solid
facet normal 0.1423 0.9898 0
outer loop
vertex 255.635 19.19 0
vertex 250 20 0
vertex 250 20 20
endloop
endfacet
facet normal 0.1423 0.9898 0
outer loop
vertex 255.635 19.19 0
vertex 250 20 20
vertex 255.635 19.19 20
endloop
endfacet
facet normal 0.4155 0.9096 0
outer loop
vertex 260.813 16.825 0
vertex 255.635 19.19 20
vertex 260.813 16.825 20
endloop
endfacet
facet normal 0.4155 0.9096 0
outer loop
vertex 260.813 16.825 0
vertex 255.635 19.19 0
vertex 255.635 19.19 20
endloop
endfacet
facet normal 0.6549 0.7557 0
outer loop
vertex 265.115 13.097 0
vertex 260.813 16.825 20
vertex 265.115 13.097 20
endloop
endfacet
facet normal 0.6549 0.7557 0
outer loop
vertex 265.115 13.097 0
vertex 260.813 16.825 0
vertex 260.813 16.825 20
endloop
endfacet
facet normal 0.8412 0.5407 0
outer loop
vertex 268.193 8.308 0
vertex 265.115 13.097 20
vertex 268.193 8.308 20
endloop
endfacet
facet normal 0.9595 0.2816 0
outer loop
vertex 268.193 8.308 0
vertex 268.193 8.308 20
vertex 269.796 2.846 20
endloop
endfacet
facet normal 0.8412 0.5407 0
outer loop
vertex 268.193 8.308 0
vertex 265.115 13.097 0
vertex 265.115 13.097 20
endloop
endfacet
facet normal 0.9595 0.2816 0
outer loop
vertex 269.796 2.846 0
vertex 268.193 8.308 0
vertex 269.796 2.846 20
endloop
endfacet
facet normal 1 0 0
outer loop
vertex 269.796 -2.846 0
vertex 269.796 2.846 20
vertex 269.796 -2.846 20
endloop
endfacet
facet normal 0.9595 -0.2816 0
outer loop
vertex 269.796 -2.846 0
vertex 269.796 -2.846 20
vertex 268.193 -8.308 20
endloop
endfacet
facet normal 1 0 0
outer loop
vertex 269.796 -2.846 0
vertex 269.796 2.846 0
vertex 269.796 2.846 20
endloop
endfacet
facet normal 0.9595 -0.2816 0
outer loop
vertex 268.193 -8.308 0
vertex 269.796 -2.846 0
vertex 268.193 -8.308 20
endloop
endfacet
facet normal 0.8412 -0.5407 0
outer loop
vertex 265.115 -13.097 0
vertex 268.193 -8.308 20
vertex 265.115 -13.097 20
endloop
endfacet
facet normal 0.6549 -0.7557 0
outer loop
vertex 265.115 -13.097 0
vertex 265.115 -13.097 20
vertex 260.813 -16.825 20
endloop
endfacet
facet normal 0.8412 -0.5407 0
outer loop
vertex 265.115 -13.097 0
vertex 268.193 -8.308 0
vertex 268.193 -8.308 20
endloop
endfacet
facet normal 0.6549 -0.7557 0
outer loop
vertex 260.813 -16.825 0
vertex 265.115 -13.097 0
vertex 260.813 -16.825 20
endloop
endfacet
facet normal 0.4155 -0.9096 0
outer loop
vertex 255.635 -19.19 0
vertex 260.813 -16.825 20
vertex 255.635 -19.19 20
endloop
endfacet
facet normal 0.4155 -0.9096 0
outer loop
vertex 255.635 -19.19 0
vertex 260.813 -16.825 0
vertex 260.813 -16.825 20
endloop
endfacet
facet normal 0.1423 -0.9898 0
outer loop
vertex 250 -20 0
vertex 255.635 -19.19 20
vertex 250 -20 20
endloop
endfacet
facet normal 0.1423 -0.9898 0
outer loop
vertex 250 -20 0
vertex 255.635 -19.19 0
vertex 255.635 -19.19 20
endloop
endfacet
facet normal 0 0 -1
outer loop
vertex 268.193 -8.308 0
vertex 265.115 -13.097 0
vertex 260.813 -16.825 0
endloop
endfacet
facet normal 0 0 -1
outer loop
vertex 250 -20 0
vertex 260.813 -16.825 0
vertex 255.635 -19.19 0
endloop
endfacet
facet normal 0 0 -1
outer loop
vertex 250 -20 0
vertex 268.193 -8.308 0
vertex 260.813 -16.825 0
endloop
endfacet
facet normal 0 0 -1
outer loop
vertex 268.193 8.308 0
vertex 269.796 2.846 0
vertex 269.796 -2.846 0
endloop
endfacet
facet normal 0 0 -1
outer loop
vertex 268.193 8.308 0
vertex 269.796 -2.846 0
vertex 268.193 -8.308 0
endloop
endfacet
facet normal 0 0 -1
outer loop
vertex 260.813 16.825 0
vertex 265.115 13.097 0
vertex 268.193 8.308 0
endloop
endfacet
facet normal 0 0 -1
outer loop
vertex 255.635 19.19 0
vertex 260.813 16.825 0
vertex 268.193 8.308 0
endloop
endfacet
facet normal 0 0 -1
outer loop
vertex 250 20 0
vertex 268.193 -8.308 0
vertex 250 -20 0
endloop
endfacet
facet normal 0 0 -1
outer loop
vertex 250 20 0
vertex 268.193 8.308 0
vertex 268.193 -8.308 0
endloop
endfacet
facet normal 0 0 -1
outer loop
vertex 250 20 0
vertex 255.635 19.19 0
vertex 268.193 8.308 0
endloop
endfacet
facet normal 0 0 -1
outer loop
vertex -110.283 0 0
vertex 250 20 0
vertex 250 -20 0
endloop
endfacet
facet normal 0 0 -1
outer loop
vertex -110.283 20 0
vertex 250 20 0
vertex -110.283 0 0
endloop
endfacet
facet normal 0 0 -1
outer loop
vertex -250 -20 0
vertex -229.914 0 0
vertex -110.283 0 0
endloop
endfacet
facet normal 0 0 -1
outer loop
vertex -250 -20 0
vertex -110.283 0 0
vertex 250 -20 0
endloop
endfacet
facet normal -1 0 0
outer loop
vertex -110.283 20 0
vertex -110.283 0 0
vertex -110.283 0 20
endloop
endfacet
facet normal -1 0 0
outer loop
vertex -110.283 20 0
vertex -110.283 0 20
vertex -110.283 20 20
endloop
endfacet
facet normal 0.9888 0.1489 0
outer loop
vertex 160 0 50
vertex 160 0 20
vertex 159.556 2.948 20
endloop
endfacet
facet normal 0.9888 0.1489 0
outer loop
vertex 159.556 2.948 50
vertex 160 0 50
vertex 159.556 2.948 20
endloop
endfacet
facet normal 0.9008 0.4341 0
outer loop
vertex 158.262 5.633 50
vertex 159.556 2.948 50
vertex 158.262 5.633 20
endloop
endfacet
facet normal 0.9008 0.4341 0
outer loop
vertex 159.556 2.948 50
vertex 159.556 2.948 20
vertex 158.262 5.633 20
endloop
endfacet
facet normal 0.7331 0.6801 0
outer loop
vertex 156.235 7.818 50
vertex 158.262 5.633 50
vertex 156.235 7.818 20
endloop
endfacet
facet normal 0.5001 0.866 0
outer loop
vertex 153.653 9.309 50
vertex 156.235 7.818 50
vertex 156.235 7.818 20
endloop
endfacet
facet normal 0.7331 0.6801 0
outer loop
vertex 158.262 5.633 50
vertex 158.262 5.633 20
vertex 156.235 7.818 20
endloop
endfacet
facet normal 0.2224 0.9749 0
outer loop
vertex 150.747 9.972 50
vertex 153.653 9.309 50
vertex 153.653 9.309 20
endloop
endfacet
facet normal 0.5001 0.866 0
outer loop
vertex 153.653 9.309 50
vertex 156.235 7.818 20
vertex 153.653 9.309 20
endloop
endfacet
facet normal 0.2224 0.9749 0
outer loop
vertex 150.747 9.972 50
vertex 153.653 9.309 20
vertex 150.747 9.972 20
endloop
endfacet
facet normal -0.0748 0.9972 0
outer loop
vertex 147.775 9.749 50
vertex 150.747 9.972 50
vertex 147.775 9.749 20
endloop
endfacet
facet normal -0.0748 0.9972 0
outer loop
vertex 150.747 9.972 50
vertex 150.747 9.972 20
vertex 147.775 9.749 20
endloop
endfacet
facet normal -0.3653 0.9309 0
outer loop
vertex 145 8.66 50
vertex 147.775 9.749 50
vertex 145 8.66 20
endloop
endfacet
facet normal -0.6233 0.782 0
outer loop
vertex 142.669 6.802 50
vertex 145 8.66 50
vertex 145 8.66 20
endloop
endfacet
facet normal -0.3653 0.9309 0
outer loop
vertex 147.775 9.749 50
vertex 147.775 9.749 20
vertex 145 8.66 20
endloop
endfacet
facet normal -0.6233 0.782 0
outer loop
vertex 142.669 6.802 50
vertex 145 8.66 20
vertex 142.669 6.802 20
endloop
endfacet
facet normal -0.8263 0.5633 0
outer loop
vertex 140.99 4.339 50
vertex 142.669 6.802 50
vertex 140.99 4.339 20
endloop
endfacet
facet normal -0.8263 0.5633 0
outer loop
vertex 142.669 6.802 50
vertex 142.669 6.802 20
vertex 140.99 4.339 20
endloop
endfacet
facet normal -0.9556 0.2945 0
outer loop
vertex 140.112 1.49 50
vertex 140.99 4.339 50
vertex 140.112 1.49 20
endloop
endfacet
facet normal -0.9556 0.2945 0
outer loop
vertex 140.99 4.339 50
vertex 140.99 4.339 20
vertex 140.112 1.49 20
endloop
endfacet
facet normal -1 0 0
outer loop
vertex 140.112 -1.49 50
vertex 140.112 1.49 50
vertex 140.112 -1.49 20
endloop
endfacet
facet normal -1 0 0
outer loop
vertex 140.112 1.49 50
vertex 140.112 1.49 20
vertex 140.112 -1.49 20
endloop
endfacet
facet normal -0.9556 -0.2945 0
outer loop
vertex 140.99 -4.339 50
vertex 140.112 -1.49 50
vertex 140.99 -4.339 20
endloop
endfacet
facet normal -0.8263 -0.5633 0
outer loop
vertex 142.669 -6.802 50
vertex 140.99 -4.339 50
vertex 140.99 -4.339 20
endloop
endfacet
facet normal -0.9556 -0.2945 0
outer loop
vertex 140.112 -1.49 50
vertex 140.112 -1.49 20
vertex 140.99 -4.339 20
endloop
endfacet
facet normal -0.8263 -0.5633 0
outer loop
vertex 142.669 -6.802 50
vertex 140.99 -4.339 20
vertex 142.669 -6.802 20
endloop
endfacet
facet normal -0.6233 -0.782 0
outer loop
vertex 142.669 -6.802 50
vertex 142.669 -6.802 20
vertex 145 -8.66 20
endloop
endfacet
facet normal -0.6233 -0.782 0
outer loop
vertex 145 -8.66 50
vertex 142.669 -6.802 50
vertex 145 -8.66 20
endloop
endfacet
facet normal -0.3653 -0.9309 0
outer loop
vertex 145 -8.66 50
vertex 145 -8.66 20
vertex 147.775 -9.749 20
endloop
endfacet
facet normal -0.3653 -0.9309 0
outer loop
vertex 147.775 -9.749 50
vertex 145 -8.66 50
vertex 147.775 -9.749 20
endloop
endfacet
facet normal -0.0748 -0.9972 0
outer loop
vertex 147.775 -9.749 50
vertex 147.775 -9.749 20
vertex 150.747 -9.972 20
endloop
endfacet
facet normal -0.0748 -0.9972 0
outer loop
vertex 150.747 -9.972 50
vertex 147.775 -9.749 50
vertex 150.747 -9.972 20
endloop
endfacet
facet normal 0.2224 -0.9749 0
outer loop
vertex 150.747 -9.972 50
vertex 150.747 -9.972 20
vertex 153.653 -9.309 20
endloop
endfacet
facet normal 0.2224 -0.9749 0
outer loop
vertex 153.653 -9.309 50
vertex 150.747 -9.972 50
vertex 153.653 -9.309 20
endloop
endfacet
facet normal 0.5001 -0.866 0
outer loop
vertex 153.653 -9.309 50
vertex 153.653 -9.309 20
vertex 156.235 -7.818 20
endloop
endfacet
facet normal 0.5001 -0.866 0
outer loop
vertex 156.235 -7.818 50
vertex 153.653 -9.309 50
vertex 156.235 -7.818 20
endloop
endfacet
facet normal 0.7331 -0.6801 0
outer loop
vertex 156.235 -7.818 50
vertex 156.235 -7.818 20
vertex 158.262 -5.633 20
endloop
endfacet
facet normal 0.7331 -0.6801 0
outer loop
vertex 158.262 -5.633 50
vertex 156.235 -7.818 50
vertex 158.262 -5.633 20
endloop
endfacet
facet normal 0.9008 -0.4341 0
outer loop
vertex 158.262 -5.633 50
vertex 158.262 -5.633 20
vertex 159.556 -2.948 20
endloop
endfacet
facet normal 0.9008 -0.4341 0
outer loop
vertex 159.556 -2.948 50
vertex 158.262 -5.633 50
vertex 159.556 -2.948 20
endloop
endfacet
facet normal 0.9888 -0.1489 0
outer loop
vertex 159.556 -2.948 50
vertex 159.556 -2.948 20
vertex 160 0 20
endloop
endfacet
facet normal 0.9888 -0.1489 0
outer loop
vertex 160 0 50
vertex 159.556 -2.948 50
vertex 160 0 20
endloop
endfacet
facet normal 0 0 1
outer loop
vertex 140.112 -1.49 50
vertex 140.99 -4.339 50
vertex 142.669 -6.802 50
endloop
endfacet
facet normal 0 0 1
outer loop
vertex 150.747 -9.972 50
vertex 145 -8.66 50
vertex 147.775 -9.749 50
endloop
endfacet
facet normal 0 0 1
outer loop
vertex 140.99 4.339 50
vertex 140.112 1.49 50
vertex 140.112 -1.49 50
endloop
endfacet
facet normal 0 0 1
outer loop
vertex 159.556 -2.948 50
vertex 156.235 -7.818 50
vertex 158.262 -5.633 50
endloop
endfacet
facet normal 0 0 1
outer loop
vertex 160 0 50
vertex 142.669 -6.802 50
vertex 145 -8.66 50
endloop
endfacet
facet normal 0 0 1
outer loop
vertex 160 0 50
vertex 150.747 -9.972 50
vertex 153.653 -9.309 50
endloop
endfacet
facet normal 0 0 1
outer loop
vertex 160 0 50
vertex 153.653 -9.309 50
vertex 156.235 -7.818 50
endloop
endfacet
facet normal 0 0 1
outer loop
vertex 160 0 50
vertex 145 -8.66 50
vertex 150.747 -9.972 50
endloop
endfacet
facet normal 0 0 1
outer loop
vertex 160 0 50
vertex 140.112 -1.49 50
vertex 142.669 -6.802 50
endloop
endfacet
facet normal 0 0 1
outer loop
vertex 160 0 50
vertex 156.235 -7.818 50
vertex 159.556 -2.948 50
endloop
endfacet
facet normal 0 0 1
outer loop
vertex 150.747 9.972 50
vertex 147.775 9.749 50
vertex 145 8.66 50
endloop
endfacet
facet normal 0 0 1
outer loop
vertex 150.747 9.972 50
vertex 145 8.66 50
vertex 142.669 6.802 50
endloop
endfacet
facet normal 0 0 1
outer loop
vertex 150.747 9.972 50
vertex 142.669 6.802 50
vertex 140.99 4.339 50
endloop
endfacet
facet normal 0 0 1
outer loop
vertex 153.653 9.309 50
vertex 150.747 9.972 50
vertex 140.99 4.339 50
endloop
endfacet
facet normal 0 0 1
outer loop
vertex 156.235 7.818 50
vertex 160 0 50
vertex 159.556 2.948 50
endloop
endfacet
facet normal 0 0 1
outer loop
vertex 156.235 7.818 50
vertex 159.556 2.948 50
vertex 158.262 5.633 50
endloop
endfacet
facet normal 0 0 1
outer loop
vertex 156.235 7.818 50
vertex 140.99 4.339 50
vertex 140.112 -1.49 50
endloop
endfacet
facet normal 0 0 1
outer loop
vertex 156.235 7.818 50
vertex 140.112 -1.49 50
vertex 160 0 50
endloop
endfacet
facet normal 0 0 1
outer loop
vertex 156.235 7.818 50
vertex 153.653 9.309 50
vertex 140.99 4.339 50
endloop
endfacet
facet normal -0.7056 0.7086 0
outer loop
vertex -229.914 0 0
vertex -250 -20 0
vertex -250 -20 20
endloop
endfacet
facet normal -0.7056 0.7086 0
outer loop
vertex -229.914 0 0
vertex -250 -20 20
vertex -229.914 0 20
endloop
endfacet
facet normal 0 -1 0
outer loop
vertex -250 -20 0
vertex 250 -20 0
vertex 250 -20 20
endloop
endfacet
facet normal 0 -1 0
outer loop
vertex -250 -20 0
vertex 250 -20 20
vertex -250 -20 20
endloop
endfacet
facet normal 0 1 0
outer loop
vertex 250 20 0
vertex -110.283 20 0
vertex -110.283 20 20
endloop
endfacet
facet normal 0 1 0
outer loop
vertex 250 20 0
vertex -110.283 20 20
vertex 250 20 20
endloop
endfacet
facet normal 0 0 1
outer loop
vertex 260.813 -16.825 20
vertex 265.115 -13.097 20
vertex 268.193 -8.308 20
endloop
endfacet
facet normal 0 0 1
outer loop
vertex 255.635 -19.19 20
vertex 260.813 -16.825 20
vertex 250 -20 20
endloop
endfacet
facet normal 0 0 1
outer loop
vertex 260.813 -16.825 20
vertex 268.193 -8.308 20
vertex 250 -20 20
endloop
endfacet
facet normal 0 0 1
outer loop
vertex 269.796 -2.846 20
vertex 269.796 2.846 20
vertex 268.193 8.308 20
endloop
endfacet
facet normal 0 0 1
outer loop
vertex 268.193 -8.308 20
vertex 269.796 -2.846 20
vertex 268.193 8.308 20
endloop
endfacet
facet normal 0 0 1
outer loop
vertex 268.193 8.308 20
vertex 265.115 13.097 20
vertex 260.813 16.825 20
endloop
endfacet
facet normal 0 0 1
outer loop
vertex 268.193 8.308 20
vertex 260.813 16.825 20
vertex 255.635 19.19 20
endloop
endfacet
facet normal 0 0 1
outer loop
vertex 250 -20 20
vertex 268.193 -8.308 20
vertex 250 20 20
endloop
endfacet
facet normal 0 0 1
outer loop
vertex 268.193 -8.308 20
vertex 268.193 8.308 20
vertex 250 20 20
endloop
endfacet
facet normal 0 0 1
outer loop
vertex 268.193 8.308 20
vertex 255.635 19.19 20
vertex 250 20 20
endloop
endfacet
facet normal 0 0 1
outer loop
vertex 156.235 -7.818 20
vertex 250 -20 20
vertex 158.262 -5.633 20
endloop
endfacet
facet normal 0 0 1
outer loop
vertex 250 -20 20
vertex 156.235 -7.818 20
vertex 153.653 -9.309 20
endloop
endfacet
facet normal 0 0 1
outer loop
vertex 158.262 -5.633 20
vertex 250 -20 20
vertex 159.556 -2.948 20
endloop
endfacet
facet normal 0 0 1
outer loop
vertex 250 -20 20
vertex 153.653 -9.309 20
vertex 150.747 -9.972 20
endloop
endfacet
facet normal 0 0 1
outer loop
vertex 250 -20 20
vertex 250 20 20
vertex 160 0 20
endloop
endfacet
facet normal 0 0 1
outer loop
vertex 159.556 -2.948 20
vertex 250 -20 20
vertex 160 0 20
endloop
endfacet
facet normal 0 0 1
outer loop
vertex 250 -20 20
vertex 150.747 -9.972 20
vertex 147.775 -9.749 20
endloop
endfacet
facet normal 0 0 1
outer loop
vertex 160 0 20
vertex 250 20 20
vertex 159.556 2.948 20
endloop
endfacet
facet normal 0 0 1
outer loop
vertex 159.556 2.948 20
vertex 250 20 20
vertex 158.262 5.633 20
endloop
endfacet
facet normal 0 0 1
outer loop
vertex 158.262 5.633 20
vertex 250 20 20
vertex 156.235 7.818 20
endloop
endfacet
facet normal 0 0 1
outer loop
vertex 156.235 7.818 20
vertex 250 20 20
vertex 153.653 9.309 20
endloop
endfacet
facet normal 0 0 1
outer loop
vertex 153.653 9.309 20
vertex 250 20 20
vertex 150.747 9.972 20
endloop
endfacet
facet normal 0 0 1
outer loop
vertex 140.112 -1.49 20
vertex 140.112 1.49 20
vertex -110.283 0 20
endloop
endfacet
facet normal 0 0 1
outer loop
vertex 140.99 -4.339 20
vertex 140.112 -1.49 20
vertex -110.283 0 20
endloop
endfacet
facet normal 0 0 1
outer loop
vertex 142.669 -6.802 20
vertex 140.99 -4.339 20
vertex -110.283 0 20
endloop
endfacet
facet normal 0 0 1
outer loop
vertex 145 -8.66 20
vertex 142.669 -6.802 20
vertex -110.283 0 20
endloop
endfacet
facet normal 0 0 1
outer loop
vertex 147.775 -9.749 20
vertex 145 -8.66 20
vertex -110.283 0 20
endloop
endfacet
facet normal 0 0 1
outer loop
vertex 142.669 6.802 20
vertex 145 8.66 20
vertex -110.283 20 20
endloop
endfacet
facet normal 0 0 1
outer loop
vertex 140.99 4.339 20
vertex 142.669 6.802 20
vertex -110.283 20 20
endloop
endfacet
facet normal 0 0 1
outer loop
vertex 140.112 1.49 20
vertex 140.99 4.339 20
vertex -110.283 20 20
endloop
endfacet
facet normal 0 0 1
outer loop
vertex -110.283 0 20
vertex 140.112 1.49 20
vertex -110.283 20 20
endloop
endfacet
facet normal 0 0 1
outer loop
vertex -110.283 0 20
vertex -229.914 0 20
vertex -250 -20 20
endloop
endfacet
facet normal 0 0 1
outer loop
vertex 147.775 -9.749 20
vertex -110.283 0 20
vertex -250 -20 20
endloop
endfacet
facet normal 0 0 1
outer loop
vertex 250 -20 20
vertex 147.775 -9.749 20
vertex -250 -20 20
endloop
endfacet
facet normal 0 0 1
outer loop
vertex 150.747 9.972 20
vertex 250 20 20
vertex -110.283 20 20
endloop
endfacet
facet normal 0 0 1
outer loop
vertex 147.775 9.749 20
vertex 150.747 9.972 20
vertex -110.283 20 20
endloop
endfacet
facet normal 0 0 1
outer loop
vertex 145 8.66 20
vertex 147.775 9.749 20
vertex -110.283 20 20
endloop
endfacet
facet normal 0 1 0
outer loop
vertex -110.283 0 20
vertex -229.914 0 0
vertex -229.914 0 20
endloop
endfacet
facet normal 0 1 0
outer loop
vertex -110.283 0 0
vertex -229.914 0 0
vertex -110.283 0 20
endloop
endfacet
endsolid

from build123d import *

# Parameters (mm, degrees)
SKETCH1_R           = 10
BOSS_EXTRUDE1_DEPTH = 20
SKETCH1_2_R         = 10
BOSS_EXTRUDE2_DEPTH = 50


with BuildPart() as part:
    # Sketch1 → Boss-Extrude1 (new body)
    with BuildSketch(Plane.XY):
        with BuildLine():
            Line((-229.914228229, 0), (-110.283225042, 0))
            Line((-110.283225042, 0), (-110.283225042, 20))
            Line((-110.283225042, 20), (250, 20))
            ThreePointArc((250, 20), (270, 0), (250, -20))
            Line((250, -20), (-250, -20))
            Line((-250, -20), (-229.914228229, 0))
        make_face()
        with Locations((150, 0)):
            Circle(SKETCH1_R, mode=Mode.SUBTRACT)
    extrude(amount=BOSS_EXTRUDE1_DEPTH)

    # Sketch1<2> → Boss-Extrude2 (add)
    with BuildSketch(Plane.XY):
        with Locations((150, 0)):
            Circle(SKETCH1_2_R)
    extrude(amount=BOSS_EXTRUDE2_DEPTH)


solid = part.part
